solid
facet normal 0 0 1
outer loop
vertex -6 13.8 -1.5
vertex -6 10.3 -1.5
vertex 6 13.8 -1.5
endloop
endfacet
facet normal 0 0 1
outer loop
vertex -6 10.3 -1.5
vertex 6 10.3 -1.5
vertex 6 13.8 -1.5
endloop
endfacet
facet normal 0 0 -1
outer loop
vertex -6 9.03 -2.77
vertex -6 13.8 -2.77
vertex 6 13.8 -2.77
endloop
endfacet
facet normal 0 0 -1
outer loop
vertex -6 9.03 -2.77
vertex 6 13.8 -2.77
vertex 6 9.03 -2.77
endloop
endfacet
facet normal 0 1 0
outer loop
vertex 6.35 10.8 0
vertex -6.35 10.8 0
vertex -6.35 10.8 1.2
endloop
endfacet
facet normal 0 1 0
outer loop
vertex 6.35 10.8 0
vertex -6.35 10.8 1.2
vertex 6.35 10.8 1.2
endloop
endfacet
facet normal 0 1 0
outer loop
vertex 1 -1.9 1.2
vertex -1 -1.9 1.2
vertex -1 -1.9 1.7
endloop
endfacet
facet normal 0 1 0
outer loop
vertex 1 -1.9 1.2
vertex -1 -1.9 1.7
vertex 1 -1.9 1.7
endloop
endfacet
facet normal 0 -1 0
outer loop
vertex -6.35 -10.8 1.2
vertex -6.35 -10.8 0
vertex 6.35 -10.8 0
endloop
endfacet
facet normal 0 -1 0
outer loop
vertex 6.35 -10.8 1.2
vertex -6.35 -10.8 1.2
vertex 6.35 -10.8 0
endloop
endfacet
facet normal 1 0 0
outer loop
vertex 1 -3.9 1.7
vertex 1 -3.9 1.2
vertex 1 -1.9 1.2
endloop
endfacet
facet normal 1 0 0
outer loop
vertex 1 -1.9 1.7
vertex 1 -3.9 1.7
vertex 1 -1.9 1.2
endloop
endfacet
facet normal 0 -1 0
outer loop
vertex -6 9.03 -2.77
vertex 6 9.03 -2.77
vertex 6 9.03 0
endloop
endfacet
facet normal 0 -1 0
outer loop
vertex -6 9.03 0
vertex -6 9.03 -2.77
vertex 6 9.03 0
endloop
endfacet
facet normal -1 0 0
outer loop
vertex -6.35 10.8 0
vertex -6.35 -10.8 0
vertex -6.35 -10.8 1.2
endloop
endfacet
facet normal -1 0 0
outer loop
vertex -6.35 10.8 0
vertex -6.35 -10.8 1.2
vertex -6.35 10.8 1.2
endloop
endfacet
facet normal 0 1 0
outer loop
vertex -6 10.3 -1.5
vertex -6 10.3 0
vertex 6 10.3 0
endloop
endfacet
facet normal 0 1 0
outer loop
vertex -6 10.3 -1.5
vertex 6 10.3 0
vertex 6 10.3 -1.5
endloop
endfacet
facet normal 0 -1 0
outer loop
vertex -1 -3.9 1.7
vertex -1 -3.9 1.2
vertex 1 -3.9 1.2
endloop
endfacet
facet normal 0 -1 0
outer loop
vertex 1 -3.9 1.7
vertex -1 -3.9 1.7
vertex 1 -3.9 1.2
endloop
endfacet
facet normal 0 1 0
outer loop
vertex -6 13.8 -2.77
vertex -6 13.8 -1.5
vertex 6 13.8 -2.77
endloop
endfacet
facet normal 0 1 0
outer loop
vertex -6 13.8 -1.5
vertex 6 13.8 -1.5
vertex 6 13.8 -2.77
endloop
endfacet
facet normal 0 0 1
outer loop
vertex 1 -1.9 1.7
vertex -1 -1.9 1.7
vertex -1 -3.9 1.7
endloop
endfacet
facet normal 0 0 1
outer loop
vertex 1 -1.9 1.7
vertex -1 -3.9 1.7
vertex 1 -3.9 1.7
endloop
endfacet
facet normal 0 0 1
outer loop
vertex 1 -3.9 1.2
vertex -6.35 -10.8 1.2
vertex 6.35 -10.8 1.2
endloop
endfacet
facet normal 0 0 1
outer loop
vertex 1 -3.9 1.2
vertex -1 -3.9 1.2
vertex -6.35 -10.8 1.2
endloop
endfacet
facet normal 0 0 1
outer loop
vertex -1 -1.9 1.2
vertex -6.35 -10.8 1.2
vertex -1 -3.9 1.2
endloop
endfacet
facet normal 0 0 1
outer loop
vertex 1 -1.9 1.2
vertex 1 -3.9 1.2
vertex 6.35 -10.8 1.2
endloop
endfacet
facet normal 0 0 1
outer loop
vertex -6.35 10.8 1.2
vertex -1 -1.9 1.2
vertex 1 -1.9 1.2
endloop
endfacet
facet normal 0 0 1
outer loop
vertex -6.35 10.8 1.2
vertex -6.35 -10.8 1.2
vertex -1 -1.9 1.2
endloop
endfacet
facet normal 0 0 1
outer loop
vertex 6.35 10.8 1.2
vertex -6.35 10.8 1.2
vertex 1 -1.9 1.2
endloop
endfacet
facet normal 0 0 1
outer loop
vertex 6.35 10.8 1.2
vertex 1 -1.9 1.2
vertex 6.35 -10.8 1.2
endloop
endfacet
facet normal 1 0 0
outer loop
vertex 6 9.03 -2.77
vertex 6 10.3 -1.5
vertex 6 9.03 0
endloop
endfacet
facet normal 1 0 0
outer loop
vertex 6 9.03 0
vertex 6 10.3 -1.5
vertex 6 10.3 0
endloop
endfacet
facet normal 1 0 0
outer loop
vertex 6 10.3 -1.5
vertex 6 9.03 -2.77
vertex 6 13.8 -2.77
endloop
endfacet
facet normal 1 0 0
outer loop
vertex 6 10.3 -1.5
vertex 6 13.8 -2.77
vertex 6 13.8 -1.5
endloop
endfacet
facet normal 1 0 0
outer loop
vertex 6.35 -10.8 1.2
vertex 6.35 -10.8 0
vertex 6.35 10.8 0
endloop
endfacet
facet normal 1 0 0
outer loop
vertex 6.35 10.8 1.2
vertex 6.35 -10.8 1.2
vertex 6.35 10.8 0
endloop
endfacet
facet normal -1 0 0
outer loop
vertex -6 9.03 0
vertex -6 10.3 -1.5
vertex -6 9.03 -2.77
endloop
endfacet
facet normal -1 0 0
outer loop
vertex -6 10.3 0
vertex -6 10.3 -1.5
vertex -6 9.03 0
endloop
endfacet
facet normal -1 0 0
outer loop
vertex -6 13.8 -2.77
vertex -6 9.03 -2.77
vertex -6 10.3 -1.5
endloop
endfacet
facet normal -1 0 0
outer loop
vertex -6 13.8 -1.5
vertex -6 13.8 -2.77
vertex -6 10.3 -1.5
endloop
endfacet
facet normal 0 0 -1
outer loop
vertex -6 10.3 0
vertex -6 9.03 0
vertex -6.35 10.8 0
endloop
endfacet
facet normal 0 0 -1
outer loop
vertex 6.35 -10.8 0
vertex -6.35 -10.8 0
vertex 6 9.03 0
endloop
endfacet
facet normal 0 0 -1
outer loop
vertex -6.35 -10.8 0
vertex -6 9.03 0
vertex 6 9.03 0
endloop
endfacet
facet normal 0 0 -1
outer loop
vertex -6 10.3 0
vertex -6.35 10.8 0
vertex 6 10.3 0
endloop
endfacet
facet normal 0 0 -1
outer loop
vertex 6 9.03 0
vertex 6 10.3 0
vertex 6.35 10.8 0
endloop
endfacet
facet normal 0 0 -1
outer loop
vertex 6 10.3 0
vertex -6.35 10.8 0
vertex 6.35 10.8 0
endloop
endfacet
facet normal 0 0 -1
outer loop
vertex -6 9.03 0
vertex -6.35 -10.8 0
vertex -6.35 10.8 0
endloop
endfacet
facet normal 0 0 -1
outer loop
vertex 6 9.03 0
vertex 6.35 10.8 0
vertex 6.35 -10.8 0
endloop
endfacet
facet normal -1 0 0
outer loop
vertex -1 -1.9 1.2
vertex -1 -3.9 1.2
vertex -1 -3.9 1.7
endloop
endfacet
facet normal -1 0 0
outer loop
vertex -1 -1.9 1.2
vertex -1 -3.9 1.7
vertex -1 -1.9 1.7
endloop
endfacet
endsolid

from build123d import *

# Parameters (mm, degrees)
ESBO_O1_W                = 12.7
ESBO_O1_H                = 21.6
RESSALTO_EXTRUS_O1_DEPTH = 1.2
ESBO_O2_W                = 2
ESBO_O2_H                = 2
RESSALTO_EXTRUS_O2_DEPTH = 0.5
RESSALTO_EXTRUS_O3_DEPTH = 6


with BuildPart() as part:
    # Esboço1 → Ressalto-extrusão1 (new body)
    with BuildSketch(Plane.XY):
        Rectangle(ESBO_O1_W, ESBO_O1_H)
    extrude(amount=RESSALTO_EXTRUS_O1_DEPTH)

    # Esboço2 → Ressalto-extrusão2 (add)
    with BuildSketch(Plane.XY.offset(1.2)):
        with Locations((0, -2.9)):
            Rectangle(ESBO_O2_W, ESBO_O2_H)
    extrude(amount=RESSALTO_EXTRUS_O2_DEPTH)

    # Esboço3 → Ressalto-extrusão3 (add, symmetric)
    with BuildSketch(Plane(origin=(0, 0, 0), x_dir=(0, 0, -1), z_dir=(1, 0, 0))):
        Polygon((0, 10.3), (1.5, 10.3), (1.5, 13.8), (2.77, 13.8), (2.77, 9.03), (0, 9.03), align=None)
    extrude(amount=RESSALTO_EXTRUS_O3_DEPTH, both=True)


solid = part.part
